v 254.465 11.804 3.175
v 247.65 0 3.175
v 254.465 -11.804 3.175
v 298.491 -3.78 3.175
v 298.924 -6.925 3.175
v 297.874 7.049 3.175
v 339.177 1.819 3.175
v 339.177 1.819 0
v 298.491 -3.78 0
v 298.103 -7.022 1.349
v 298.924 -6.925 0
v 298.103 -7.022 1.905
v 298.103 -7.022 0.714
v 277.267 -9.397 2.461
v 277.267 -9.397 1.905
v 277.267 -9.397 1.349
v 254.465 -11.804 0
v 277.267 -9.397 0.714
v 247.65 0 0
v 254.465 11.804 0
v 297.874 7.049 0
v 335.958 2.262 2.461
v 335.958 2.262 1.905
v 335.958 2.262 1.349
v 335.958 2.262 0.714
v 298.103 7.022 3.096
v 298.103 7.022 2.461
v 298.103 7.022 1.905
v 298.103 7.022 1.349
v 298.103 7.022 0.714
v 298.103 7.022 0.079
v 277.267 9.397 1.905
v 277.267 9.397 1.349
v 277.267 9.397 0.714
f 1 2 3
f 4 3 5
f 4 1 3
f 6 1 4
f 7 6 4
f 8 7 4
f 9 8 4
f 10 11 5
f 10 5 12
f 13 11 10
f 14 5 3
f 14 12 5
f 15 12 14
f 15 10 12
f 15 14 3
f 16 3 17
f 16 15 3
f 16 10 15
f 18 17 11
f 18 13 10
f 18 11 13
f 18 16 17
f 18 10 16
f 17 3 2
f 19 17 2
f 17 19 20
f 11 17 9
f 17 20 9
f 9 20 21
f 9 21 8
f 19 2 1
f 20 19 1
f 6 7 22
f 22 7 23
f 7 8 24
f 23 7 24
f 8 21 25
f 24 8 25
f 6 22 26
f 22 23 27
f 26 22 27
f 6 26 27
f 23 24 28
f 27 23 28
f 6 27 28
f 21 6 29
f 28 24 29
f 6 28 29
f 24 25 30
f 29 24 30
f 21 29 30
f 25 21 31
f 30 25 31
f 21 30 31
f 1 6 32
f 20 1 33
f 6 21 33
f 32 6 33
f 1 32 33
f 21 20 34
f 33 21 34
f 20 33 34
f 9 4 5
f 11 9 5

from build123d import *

# Parameters (mm, degrees)
BOSS_EXTRUDE1_DEPTH = 3.175
CUT_EXTRUDE1_DEPTH  = 5.08


with BuildPart() as part:
    # Sketch2 → Boss-Extrude1 (new body)
    with BuildSketch(Plane.XY):
        with BuildLine():
            add(Edge.make_bspline(
                [(349.25, 0), (349.081845346, 0.195028946), (348.546486748, 0.815947966), (346.670763268, 0.635287815), (344.11086643, 1.231330826), (340.348873806, 1.640765335), (335.631665172, 2.319189902), (329.896669995, 3.064968776), (323.213152208, 3.937751592), (315.610665982, 4.899637326), (307.139892382, 5.94572983), (297.851820227, 7.058039906), (287.804163994, 8.223966301), (277.05860736, 9.42727111), (265.681494766, 10.653371923), (253.743033604, 11.887008331), (241.316804275, 13.11226643), (228.479451099, 14.31194461), (215.310032455, 15.470294327), (201.889886046, 16.567949836), (188.301472832, 17.587013879), (174.628693344, 18.508566703), (160.95579103, 19.313339436), (147.366939387, 19.981000511), (133.946062727, 20.493746123), (120.775518049, 20.834848585), (107.936696619, 20.987647162), (95.508487727, 20.940015693), (83.567514363, 20.682753776), (72.187279219, 20.209340103), (61.437827927, 19.518536296), (51.385233466, 18.612420938), (42.090988888, 17.498070831), (33.611817078, 16.184967443), (25.998868366, 14.686825017), (19.297496021, 13.02058345), (13.543519177, 11.202490675), (8.772941595, 9.249479701), (4.98137124, 7.174763565), (2.229693173, 4.974247418), (0.364862544, 2.594695774), (0.115985535, 0.824823436), (0, 0)],
                knots=[0, 0, 0, 0, 0.002091853, 0.006659889, 0.014240034, 0.024784942, 0.038226646, 0.054481348, 0.073444809, 0.094998776, 0.11900639, 0.145318898, 0.173770288, 0.204183654, 0.236370679, 0.270129473, 0.305250351, 0.341516861, 0.378701149, 0.416575318, 0.454902219, 0.493447217, 0.531971459, 0.57023708, 0.608012632, 0.645066312, 0.681178002, 0.716129843, 0.74971807, 0.781748295, 0.812036536, 0.840415327, 0.866732056, 0.890849065, 0.912651845, 0.932046273, 0.94897292, 0.963413199, 0.975421325, 0.985175212, 0.993091122, 1, 1, 1, 1], degree=3))
            add(Edge.make_bspline(
                [(349.25, 0), (349.081845346, -0.195028946), (348.546486748, -0.815947966), (346.670763268, -0.635287815), (344.11086643, -1.231330826), (340.348873806, -1.640765335), (335.631665172, -2.319189902), (329.896669995, -3.064968776), (323.213152208, -3.937751592), (315.610665982, -4.899637326), (307.139892382, -5.94572983), (297.851820227, -7.058039906), (287.804163994, -8.223966301), (277.05860736, -9.42727111), (265.681494766, -10.653371923), (253.743033604, -11.887008331), (241.316804275, -13.11226643), (228.479451099, -14.31194461), (215.310032455, -15.470294327), (201.889886046, -16.567949836), (188.301472832, -17.587013879), (174.628693344, -18.508566703), (160.95579103, -19.313339436), (147.366939387, -19.981000511), (133.946062727, -20.493746123), (120.775518049, -20.834848585), (107.936696619, -20.987647162), (95.508487727, -20.940015693), (83.567514363, -20.682753776), (72.187279219, -20.209340103), (61.437827927, -19.518536296), (51.385233466, -18.612420938), (42.090988888, -17.498070831), (33.611817078, -16.184967443), (25.998868366, -14.686825017), (19.297496021, -13.02058345), (13.543519177, -11.202490675), (8.772941595, -9.249479701), (4.98137124, -7.174763565), (2.229693173, -4.974247418), (0.364862544, -2.594695774), (0.115985535, -0.824823436), (0, 0)],
                knots=[0, 0, 0, 0, 0.002091853, 0.006659889, 0.014240034, 0.024784942, 0.038226646, 0.054481348, 0.073444809, 0.094998776, 0.11900639, 0.145318898, 0.173770288, 0.204183654, 0.236370679, 0.270129473, 0.305250351, 0.341516861, 0.378701149, 0.416575318, 0.454902219, 0.493447217, 0.531971459, 0.57023708, 0.608012632, 0.645066312, 0.681178002, 0.716129843, 0.74971807, 0.781748295, 0.812036536, 0.840415327, 0.866732056, 0.890849065, 0.912651845, 0.932046273, 0.94897292, 0.963413199, 0.975421325, 0.985175212, 0.993091122, 1, 1, 1, 1], degree=3))
        make_face()
    extrude(amount=BOSS_EXTRUDE1_DEPTH)

    # Sketch3 → Cut-Extrude1 (cut)
    with BuildSketch(Plane.XY.offset(3.175)):
        Polygon((247.65, 50.8), (0, 50.8), (0, 0), (0, -50.8), (247.65, -50.8), (254.465257243, -11.804371811), (247.65, 0), (254.465257243, 11.804371811), align=None)
        Polygon((299.357110071, -10.070757643), (349.68283748, -3.145357963), (348.81716252, 3.145357963), (298.491435111, -3.780041717), align=None)
    extrude(amount=-CUT_EXTRUDE1_DEPTH, mode=Mode.SUBTRACT)


solid = part.part
